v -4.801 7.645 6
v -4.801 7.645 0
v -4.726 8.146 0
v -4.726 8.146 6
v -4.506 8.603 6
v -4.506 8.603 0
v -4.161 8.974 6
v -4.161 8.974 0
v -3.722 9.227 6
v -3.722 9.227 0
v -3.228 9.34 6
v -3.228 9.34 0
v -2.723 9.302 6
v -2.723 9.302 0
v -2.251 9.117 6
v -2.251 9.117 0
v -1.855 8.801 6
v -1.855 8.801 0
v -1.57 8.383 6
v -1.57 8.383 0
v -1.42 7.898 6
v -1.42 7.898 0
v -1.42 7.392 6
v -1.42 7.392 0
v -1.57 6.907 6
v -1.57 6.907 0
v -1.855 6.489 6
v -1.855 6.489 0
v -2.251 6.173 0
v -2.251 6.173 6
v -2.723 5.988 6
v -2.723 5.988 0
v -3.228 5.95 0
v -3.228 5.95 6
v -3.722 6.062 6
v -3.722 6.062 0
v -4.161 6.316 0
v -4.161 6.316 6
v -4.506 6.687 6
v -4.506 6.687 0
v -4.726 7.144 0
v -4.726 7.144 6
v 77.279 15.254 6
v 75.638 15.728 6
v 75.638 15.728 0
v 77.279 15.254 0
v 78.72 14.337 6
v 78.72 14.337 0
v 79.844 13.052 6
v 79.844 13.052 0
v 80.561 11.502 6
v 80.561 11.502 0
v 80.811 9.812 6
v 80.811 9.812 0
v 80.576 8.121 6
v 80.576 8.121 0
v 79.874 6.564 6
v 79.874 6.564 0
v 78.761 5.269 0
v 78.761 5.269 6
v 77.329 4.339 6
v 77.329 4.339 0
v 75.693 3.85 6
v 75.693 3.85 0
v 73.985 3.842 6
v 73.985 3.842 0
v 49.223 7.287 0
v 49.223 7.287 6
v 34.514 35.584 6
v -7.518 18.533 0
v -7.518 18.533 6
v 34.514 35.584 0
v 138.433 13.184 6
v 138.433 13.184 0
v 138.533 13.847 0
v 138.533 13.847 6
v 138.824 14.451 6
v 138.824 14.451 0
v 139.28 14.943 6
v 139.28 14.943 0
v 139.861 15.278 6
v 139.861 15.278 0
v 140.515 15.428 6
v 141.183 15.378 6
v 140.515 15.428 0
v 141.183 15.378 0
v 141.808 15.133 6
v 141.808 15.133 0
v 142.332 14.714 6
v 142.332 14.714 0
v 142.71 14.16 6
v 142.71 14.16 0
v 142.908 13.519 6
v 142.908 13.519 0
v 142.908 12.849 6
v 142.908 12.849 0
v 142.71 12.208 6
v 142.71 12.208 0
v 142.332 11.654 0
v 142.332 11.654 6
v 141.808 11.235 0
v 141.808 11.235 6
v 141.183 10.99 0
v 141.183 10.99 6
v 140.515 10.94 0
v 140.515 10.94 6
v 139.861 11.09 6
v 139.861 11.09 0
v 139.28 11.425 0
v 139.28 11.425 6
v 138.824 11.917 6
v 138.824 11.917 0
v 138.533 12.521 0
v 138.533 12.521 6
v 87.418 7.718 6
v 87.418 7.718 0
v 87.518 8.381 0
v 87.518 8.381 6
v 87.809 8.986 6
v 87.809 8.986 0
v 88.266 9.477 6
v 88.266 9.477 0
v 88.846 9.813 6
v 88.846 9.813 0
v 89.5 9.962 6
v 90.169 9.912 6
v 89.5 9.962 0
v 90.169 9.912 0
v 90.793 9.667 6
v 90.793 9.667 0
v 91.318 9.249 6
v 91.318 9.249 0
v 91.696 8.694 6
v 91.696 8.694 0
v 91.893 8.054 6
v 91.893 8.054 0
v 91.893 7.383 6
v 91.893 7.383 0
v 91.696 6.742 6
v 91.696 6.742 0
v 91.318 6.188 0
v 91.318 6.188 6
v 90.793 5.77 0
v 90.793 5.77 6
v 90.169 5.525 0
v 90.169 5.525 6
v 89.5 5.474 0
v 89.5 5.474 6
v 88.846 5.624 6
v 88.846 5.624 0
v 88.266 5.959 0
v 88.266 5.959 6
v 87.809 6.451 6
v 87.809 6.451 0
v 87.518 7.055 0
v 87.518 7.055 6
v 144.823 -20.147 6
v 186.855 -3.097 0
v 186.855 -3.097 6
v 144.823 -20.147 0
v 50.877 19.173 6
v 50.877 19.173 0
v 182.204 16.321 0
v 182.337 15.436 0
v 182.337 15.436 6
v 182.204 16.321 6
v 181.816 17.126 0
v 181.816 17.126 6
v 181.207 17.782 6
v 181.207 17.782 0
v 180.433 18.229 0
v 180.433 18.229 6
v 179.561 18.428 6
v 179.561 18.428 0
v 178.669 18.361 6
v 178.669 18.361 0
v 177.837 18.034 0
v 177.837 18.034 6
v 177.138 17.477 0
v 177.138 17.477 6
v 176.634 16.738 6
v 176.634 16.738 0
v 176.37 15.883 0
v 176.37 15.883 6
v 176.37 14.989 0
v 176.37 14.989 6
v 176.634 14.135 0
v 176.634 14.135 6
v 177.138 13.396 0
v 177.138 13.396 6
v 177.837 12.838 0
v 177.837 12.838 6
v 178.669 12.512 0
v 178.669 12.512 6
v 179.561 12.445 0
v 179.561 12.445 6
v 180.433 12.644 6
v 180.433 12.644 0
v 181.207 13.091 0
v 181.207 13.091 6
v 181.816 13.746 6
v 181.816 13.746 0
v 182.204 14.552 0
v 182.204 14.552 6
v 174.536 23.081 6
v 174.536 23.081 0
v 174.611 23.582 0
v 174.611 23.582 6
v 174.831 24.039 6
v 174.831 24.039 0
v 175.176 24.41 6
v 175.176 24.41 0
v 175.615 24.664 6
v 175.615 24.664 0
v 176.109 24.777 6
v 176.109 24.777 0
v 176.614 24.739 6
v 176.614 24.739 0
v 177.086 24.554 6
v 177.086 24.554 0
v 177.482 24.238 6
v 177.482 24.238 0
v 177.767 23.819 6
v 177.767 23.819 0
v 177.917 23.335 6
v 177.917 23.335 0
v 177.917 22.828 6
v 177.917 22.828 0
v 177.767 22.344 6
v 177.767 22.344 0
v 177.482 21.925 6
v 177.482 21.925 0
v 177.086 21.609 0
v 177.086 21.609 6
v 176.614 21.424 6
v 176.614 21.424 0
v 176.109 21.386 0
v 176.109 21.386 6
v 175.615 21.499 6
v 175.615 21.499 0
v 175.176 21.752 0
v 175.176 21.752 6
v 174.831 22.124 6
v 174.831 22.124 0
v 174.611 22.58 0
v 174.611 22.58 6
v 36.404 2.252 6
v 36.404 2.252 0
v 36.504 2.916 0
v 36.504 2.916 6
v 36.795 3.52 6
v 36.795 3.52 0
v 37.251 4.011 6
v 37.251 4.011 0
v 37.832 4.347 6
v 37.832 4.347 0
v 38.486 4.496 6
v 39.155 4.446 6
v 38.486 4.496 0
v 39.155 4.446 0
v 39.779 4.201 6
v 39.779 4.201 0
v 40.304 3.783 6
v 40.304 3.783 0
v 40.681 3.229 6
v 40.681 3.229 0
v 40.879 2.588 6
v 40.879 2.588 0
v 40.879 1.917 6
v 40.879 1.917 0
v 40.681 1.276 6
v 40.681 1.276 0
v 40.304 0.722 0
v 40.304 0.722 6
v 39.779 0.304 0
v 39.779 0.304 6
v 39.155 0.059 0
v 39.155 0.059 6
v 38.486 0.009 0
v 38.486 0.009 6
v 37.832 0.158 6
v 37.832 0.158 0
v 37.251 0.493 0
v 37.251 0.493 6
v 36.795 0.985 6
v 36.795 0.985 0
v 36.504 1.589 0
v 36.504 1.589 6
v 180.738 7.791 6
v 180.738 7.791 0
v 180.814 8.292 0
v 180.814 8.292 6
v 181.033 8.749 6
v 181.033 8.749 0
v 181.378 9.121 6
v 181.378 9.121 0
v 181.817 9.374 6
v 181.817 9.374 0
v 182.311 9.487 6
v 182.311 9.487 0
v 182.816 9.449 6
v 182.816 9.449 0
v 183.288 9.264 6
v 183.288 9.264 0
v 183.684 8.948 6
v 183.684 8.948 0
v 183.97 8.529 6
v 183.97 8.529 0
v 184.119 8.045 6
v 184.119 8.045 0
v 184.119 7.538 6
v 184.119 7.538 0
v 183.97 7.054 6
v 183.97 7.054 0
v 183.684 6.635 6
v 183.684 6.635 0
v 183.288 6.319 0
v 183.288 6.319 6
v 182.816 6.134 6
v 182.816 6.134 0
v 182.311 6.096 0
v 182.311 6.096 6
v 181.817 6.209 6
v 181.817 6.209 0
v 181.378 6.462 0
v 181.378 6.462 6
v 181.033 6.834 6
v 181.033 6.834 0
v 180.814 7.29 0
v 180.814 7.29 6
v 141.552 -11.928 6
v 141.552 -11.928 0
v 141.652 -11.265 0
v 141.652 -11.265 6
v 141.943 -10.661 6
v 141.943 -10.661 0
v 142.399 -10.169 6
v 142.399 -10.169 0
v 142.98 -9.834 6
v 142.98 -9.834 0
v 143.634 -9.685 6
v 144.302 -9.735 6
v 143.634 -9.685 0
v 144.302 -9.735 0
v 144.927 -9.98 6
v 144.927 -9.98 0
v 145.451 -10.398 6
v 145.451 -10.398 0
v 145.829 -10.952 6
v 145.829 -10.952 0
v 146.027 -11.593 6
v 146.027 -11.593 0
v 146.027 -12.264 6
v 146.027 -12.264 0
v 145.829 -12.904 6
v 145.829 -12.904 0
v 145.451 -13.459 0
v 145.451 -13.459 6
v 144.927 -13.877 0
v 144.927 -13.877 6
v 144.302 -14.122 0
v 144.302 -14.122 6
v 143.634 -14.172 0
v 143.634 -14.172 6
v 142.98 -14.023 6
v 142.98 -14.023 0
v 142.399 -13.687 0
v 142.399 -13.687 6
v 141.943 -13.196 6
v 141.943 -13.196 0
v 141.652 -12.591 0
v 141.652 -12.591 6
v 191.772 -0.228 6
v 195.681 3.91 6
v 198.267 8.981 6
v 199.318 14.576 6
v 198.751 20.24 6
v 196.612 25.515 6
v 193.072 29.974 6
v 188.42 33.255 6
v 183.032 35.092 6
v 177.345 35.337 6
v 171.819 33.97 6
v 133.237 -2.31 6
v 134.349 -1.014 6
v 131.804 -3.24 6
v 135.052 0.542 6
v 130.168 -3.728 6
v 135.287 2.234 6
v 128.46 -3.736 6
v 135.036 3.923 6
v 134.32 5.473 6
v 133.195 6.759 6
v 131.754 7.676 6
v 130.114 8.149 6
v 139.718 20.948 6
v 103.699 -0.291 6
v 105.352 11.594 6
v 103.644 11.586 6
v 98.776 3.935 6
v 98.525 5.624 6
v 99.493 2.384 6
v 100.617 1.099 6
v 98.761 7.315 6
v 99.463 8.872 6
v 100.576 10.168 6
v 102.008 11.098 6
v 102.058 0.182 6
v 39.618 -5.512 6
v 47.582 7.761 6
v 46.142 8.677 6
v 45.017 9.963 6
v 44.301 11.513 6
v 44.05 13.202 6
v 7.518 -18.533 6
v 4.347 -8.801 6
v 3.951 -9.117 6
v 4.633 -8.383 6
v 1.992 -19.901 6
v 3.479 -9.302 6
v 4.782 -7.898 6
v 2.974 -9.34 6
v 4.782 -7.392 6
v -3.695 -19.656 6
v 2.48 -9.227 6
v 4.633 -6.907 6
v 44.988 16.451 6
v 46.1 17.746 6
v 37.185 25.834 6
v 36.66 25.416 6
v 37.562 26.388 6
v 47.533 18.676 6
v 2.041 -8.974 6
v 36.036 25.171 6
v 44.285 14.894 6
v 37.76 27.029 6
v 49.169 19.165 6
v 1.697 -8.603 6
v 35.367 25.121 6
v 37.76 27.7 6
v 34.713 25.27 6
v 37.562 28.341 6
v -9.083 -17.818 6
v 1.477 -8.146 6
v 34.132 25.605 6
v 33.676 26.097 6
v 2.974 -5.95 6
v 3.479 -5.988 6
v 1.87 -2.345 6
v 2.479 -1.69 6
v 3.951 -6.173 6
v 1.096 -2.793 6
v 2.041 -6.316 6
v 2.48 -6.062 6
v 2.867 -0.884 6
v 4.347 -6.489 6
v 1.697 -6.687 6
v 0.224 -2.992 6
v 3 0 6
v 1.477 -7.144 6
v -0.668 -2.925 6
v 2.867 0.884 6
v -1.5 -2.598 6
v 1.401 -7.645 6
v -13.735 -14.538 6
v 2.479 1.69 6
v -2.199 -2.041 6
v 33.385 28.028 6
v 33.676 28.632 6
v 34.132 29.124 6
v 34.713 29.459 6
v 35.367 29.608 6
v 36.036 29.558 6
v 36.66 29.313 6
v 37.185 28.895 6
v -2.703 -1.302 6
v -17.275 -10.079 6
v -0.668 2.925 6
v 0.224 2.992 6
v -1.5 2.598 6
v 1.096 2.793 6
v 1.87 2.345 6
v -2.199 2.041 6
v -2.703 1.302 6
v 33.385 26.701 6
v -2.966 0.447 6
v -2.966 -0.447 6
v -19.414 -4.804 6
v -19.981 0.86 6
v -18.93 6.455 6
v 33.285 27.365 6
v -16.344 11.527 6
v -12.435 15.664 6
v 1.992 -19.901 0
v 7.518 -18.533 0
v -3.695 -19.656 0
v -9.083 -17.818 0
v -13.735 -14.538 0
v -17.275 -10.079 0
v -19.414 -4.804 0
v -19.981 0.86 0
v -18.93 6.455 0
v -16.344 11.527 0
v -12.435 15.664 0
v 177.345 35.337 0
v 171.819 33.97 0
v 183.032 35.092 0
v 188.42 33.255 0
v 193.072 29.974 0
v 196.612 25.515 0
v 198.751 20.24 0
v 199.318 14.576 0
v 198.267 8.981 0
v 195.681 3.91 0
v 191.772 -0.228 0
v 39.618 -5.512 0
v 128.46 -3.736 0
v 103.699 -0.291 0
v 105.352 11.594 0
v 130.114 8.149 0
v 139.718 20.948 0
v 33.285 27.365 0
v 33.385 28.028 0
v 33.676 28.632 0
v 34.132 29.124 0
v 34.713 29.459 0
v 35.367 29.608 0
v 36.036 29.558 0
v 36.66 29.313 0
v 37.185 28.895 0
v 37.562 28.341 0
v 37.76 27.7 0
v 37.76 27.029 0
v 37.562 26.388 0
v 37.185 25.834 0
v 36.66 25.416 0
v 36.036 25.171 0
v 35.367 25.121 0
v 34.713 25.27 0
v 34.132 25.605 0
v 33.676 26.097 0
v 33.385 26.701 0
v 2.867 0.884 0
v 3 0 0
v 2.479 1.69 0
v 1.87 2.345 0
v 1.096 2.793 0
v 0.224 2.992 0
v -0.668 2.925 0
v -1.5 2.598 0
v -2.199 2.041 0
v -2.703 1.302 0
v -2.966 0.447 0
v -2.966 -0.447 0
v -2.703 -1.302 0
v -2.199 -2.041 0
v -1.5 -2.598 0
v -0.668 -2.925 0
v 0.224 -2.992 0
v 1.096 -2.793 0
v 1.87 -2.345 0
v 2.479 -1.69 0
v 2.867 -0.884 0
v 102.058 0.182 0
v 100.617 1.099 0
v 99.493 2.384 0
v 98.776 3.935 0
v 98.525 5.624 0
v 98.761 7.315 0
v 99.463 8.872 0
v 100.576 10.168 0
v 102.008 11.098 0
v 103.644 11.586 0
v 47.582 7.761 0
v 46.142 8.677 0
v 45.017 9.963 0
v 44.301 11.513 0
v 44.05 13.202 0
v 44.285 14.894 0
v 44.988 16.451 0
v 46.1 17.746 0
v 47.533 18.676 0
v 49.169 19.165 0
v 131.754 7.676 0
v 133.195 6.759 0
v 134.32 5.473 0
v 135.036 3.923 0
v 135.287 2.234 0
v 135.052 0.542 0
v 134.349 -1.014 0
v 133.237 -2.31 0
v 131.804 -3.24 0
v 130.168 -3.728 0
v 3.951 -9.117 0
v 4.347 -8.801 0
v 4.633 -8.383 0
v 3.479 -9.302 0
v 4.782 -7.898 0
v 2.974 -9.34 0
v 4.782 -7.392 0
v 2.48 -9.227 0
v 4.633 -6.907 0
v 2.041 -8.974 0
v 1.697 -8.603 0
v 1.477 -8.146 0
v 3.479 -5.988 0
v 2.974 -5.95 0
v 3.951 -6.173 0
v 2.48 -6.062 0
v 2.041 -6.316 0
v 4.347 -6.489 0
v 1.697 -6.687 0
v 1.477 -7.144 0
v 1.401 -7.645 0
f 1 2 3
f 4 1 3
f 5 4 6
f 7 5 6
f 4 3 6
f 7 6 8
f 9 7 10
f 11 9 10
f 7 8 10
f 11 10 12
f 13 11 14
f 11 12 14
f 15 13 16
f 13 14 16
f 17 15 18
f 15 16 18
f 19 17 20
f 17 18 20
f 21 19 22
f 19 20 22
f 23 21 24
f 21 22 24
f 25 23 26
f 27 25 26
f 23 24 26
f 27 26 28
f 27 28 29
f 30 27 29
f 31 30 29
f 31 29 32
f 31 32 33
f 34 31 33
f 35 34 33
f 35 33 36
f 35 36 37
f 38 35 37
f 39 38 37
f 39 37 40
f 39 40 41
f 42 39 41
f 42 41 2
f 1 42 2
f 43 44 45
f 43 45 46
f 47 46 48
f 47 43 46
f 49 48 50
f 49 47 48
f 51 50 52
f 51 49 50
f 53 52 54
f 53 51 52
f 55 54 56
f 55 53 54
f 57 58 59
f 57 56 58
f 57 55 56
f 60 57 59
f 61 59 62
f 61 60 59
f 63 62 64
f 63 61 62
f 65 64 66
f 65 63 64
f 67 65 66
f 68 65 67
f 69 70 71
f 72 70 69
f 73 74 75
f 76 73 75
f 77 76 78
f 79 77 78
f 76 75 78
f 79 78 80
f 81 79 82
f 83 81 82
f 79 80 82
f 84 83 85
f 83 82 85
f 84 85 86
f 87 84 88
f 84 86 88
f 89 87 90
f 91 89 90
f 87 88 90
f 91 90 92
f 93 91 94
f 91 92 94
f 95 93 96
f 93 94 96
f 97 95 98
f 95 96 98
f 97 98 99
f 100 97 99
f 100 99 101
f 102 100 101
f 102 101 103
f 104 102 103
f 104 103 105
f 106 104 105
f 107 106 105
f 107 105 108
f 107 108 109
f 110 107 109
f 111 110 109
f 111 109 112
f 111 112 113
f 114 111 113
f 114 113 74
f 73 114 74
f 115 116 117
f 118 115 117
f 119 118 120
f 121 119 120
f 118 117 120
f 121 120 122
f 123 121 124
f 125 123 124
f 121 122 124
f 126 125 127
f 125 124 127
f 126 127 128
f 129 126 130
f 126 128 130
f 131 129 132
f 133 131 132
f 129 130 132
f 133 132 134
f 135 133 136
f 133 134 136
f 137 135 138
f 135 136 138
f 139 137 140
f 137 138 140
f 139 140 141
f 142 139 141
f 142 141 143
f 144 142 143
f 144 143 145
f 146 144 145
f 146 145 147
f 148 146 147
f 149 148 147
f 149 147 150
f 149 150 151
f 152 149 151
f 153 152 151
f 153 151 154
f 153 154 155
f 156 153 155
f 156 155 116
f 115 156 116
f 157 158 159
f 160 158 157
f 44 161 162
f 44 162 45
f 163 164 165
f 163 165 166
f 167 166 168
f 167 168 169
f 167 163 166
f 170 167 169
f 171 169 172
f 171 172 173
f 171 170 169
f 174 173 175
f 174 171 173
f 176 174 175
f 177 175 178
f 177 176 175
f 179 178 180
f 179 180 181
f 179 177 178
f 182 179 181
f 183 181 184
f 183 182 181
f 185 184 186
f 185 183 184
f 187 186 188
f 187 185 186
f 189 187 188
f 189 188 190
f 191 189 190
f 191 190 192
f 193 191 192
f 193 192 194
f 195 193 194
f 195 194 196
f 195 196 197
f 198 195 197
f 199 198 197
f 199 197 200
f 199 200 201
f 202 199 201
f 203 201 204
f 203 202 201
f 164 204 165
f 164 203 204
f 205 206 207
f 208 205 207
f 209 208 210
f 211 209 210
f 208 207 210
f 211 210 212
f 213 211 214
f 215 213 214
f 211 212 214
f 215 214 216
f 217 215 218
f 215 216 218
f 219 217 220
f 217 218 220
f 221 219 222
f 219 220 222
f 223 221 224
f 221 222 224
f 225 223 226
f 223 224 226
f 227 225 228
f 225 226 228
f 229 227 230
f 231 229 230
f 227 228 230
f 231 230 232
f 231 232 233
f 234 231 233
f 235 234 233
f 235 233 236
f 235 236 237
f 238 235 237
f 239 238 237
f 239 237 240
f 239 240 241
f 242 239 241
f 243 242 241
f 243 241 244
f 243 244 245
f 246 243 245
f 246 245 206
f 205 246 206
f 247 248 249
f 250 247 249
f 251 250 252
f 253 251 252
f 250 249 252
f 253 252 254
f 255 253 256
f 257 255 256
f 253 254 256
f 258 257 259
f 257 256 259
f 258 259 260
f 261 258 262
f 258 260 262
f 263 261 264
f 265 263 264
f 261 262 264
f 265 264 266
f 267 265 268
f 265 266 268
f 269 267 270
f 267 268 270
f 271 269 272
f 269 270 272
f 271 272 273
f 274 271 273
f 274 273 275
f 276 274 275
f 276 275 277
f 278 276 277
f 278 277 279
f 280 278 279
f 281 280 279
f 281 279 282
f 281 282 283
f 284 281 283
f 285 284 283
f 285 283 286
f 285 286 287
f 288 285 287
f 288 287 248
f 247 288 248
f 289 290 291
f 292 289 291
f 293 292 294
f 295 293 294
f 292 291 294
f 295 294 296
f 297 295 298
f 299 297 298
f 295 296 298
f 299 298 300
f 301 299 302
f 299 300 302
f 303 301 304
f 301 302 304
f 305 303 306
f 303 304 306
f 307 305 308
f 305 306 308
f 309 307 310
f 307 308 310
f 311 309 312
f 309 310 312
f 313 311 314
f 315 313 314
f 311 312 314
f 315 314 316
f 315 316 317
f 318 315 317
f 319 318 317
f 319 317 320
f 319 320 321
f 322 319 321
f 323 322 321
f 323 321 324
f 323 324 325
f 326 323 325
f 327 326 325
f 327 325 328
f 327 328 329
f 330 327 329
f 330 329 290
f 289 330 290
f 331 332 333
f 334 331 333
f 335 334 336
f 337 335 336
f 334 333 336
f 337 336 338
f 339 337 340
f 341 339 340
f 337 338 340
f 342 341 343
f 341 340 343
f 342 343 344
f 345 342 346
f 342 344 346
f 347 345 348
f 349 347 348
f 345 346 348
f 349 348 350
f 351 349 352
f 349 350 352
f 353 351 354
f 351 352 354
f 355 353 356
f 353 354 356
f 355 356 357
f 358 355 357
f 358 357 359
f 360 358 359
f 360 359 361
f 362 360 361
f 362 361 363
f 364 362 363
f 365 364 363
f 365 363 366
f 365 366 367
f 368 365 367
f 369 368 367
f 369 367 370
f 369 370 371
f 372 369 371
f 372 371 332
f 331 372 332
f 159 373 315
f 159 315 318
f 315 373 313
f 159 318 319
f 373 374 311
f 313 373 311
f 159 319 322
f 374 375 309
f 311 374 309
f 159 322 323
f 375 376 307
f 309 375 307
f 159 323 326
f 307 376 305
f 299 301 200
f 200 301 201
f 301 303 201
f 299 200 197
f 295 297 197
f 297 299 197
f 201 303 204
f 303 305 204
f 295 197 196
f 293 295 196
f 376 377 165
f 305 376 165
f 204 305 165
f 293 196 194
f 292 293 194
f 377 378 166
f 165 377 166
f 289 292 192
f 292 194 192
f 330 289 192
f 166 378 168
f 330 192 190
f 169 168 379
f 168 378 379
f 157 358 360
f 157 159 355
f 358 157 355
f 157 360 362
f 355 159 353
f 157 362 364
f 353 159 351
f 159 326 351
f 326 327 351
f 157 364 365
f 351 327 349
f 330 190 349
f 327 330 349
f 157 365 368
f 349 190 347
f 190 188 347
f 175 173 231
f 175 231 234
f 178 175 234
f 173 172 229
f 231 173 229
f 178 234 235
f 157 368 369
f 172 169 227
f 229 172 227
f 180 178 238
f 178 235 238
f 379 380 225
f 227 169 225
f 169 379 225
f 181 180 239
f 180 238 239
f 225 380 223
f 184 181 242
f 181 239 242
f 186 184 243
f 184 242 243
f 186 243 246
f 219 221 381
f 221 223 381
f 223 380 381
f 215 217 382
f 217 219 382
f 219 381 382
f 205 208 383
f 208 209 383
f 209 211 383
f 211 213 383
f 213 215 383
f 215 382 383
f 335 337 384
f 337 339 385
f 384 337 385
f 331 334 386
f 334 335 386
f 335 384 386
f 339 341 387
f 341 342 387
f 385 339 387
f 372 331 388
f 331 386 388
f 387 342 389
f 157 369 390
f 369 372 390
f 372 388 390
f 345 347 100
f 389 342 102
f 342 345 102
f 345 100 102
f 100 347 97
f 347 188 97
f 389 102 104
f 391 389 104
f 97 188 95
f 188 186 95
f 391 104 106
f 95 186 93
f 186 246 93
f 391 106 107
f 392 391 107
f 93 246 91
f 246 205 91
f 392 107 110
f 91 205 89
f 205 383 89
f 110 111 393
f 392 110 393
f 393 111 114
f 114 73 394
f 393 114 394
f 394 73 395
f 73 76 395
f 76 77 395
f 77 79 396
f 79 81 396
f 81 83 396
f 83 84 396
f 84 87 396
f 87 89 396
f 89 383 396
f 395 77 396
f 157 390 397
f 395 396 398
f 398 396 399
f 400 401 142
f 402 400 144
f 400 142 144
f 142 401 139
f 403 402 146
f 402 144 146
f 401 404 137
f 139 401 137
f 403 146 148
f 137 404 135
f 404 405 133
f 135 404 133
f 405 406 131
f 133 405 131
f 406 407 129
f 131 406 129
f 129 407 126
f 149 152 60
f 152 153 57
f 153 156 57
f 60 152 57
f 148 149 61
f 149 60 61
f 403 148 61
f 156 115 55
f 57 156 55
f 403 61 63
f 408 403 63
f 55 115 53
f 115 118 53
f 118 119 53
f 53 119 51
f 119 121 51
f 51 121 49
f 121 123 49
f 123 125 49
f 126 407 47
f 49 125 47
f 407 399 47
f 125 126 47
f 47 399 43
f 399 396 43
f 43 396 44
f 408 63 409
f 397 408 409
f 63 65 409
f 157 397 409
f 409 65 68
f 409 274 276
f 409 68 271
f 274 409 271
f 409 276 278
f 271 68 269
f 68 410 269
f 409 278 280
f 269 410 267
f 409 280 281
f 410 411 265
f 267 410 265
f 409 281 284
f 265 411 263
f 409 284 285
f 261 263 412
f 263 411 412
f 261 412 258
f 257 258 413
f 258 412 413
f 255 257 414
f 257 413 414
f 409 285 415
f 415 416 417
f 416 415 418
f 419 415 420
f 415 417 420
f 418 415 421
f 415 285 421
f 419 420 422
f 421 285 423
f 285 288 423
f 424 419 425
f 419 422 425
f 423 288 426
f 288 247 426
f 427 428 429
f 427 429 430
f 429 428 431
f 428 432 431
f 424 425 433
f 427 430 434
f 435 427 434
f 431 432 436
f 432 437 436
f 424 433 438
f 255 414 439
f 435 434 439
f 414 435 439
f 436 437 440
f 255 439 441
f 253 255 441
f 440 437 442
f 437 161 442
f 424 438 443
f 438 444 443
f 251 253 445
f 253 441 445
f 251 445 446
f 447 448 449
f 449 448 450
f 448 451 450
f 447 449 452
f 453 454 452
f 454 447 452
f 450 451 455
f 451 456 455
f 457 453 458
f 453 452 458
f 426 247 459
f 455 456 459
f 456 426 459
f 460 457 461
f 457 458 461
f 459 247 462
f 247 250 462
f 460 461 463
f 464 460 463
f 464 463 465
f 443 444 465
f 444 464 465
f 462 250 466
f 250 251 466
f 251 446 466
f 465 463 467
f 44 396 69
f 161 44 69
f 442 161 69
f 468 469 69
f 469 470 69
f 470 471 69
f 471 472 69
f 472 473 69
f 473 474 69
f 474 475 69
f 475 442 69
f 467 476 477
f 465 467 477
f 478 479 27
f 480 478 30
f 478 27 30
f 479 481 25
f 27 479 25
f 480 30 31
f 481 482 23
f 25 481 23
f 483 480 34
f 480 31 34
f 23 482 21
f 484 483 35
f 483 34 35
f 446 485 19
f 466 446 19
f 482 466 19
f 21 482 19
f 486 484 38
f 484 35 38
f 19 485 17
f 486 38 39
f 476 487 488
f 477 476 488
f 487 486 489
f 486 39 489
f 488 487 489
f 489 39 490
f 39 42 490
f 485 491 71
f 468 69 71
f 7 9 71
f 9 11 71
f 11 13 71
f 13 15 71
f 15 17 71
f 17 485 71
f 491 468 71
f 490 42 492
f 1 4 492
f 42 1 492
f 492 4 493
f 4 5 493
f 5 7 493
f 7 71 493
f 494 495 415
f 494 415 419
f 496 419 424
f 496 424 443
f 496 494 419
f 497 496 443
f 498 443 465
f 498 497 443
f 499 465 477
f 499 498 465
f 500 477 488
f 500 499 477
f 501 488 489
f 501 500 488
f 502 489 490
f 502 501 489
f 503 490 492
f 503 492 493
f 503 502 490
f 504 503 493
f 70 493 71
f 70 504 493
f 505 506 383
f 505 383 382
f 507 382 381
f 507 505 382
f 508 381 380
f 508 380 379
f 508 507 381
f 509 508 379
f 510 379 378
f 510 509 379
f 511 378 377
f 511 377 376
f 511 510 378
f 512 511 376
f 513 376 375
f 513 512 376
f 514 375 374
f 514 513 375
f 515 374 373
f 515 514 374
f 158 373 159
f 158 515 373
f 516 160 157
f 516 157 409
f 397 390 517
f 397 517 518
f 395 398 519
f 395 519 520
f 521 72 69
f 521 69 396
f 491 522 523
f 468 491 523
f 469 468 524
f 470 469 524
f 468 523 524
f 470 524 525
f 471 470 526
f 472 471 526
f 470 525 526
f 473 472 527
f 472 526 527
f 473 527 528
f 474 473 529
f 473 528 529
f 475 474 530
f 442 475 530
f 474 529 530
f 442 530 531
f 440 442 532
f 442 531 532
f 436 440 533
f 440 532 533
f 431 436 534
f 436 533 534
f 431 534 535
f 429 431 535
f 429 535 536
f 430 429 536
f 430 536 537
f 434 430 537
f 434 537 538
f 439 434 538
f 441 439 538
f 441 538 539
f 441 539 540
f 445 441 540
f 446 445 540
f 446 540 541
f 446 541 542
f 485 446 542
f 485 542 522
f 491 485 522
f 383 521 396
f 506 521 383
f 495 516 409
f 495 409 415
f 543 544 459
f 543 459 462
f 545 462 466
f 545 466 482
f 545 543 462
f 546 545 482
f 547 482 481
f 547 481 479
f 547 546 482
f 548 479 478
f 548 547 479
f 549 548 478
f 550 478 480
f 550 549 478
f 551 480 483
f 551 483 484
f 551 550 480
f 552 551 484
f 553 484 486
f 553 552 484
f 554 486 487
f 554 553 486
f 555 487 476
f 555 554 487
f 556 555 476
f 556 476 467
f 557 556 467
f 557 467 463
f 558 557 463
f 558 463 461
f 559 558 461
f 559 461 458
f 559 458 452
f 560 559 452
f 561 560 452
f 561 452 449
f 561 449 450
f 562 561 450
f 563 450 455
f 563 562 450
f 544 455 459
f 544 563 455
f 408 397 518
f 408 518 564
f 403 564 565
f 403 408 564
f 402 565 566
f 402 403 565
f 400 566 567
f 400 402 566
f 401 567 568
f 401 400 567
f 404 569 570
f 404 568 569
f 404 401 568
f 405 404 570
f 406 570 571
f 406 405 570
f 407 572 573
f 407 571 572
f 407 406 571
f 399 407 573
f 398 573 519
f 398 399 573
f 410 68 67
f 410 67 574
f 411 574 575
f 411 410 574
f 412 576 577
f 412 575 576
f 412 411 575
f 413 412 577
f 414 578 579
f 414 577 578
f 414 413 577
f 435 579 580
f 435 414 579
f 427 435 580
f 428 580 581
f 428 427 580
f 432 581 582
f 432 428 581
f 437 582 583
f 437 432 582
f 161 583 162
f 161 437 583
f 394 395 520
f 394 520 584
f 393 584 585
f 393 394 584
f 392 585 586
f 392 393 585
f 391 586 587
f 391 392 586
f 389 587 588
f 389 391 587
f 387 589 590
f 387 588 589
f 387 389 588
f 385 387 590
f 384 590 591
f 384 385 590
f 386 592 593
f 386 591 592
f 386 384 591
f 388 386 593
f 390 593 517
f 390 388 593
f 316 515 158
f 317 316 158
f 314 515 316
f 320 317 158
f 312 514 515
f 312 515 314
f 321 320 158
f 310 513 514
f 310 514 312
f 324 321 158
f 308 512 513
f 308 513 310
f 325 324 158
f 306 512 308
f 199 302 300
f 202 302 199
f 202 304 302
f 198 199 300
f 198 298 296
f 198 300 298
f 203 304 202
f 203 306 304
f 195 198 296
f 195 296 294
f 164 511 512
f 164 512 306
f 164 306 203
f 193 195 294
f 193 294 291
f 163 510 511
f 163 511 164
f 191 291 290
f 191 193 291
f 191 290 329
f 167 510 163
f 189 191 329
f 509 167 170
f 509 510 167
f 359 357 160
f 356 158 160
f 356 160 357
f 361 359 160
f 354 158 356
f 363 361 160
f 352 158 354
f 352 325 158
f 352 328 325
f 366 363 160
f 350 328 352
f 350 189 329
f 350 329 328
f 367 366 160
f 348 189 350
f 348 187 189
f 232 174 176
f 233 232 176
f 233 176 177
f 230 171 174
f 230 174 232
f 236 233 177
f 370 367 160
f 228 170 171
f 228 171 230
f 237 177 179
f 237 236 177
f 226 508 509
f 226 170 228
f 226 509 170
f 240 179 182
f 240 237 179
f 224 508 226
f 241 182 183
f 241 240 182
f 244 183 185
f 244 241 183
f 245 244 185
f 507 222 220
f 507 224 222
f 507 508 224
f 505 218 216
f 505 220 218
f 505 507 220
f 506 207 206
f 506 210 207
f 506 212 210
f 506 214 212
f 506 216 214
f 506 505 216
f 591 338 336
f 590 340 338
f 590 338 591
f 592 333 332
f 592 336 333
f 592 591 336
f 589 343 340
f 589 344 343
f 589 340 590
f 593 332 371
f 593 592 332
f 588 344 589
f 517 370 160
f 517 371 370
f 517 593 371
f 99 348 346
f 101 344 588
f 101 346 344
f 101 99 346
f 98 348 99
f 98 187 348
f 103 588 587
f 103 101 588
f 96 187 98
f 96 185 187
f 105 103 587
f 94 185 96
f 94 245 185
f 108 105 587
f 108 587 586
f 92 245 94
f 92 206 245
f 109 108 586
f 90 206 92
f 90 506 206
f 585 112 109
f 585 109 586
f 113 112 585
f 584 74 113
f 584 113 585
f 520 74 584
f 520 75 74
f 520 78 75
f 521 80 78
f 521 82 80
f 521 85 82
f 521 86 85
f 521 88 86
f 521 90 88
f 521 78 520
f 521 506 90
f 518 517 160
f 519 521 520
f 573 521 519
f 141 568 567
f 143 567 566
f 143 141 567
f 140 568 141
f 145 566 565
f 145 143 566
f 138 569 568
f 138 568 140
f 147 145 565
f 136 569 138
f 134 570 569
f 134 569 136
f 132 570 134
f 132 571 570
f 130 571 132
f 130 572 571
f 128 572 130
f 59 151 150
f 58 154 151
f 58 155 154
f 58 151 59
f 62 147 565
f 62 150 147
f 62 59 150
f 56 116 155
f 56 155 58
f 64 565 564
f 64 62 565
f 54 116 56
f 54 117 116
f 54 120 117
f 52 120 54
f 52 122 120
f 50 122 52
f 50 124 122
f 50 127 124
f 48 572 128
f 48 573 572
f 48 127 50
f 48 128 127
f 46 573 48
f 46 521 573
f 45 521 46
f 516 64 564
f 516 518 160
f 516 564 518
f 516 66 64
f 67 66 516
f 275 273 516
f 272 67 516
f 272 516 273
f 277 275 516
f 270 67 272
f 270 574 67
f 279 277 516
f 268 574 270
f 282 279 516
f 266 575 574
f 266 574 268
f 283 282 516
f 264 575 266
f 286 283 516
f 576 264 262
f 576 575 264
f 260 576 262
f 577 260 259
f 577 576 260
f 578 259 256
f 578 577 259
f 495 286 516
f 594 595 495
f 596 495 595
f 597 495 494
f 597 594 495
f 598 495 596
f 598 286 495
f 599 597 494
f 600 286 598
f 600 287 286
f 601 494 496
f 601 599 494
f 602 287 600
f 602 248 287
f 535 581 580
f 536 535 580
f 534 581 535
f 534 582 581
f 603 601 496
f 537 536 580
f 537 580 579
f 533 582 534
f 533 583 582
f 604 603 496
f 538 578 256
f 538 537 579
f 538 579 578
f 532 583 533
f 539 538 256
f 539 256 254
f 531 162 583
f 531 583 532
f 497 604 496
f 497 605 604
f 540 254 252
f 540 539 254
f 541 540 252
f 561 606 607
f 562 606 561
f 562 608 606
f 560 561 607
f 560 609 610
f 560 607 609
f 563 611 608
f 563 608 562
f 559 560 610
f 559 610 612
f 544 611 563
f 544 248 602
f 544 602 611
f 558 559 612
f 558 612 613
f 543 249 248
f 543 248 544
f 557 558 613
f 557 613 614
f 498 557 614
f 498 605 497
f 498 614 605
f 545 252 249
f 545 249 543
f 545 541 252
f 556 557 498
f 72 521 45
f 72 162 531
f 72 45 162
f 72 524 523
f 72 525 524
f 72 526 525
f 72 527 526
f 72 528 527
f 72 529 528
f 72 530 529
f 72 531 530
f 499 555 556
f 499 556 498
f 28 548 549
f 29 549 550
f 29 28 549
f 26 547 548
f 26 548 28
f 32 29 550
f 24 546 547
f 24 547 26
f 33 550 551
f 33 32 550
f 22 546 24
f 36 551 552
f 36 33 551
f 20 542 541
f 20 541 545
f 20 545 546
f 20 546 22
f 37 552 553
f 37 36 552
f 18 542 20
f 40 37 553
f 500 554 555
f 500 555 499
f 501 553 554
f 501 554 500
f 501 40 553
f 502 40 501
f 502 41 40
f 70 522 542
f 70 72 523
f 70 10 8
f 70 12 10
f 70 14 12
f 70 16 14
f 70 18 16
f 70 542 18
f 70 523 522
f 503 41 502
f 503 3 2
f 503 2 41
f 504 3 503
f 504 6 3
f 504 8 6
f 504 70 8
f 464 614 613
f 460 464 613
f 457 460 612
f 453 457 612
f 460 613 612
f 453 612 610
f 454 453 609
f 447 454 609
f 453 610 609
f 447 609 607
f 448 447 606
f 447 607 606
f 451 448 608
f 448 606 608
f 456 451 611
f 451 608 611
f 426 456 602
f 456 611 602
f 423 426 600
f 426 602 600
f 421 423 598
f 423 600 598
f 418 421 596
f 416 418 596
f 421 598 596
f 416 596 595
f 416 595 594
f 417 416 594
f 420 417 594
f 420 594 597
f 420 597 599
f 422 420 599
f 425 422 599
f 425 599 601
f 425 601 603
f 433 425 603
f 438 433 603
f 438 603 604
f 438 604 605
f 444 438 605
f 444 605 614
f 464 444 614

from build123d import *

# Parameters (mm, degrees)
SKETCH1_R                = 3
BOSS_EXTRUDE2_DEPTH      = 6
M4_CLEARANCE_HOLE1_D     = 4.5
M4_CLEARANCE_HOLE1_DEPTH = 84
M4_CLEARANCE_HOLE1_TIP   = 1.351936393
CUT_EXTRUDE1_DEPTH       = 203.576880123
M3_CLEARANCE_HOLE1_D     = 3.4


with BuildPart() as part:
    # Sketch1 → Boss-Extrude2 (new body)
    with BuildSketch(Plane.XY):
        with BuildLine():
            Line((139.718429351, 20.947970782), (171.818869964, 33.969557183))
            ThreePointArc((171.818869964, 33.969557183), (197.870084408, 22.954375569), (186.854902793, -3.096838875))
            Line((186.854902793, -3.096838875), (144.82255129, -20.147318131))
            Line((144.82255129, -20.147318131), (39.618457028, -5.511611627))
            Line((39.618457028, -5.511611627), (7.518016414, -18.533198029))
            ThreePointArc((7.518016414, -18.533198029), (-18.533198029, -7.518016414), (-7.518016414, 18.533198029))
            Line((-7.518016414, 18.533198029), (34.514335089, 35.583677285))
            Line((34.514335089, 35.583677285), (139.718429351, 20.947970782))
        make_face()
        with Locations((179.336886379, 15.436359154)):
            Circle(SKETCH1_R, mode=Mode.SUBTRACT)
        Circle(SKETCH1_R, mode=Mode.SUBTRACT)
    extrude(amount=BOSS_EXTRUDE2_DEPTH)

    # M4 Clearance Hole1
    with Locations(Plane(origin=(35.535159477, 27.364619503, 6), x_dir=(1, 0, 0), z_dir=(0, 0, 1))):
        with Locations((0, 0), (108.266567425, -39.292879851), (3.118996753, -25.112266952), (105.147570672, -14.1806129), (54.133283712, -19.646439926)):
            Hole(M4_CLEARANCE_HOLE1_D / 2, depth=M4_CLEARANCE_HOLE1_DEPTH)
            with Locations((0, 0, -(M4_CLEARANCE_HOLE1_DEPTH + M4_CLEARANCE_HOLE1_TIP / 2))):  # 118° drill point
                Cone(0, M4_CLEARANCE_HOLE1_D / 2, M4_CLEARANCE_HOLE1_TIP, mode=Mode.SUBTRACT)

    # Sketch5 → Cut-Extrude1 (cut, through all)
    with BuildSketch(Plane.XY.offset(6)):
        with BuildLine():
            Line((128.460158473, -3.736200604), (103.698622831, -0.291443337))
            ThreePointArc((103.698622831, -0.291443337), (98.582596021, 6.478066961), (105.352106319, 11.594093771))
            Line((105.352106319, 11.594093771), (130.113641961, 8.149336504))
            ThreePointArc((130.113641961, 8.149336504), (135.229668771, 1.379826206), (128.460158473, -3.736200604))
        make_face()
        with BuildLine():
            Line((73.98478006, 3.842265383), (49.223244417, 7.28702265))
            ThreePointArc((49.223244417, 7.28702265), (44.107217607, 14.056532949), (50.876727906, 19.172559759))
            Line((50.876727906, 19.172559759), (75.638263548, 15.727802492))
            ThreePointArc((75.638263548, 15.727802492), (80.754290358, 8.958292193), (73.98478006, 3.842265383))
        make_face()
    extrude(amount=-CUT_EXTRUDE1_DEPTH, mode=Mode.SUBTRACT)

    # M3 Clearance Hole1 (through all)
    with Locations(Plane(origin=(182.43806815, 7.791414967, 6), x_dir=(1, 0, 0), z_dir=(0, 0, 1))):
        with Locations((0, 0), (-6.202363542, 15.289888374), (-185.539249921, -0.14647078), (-179.336886379, -15.436359154)):
            Hole(M3_CLEARANCE_HOLE1_D / 2)


solid = part.part
